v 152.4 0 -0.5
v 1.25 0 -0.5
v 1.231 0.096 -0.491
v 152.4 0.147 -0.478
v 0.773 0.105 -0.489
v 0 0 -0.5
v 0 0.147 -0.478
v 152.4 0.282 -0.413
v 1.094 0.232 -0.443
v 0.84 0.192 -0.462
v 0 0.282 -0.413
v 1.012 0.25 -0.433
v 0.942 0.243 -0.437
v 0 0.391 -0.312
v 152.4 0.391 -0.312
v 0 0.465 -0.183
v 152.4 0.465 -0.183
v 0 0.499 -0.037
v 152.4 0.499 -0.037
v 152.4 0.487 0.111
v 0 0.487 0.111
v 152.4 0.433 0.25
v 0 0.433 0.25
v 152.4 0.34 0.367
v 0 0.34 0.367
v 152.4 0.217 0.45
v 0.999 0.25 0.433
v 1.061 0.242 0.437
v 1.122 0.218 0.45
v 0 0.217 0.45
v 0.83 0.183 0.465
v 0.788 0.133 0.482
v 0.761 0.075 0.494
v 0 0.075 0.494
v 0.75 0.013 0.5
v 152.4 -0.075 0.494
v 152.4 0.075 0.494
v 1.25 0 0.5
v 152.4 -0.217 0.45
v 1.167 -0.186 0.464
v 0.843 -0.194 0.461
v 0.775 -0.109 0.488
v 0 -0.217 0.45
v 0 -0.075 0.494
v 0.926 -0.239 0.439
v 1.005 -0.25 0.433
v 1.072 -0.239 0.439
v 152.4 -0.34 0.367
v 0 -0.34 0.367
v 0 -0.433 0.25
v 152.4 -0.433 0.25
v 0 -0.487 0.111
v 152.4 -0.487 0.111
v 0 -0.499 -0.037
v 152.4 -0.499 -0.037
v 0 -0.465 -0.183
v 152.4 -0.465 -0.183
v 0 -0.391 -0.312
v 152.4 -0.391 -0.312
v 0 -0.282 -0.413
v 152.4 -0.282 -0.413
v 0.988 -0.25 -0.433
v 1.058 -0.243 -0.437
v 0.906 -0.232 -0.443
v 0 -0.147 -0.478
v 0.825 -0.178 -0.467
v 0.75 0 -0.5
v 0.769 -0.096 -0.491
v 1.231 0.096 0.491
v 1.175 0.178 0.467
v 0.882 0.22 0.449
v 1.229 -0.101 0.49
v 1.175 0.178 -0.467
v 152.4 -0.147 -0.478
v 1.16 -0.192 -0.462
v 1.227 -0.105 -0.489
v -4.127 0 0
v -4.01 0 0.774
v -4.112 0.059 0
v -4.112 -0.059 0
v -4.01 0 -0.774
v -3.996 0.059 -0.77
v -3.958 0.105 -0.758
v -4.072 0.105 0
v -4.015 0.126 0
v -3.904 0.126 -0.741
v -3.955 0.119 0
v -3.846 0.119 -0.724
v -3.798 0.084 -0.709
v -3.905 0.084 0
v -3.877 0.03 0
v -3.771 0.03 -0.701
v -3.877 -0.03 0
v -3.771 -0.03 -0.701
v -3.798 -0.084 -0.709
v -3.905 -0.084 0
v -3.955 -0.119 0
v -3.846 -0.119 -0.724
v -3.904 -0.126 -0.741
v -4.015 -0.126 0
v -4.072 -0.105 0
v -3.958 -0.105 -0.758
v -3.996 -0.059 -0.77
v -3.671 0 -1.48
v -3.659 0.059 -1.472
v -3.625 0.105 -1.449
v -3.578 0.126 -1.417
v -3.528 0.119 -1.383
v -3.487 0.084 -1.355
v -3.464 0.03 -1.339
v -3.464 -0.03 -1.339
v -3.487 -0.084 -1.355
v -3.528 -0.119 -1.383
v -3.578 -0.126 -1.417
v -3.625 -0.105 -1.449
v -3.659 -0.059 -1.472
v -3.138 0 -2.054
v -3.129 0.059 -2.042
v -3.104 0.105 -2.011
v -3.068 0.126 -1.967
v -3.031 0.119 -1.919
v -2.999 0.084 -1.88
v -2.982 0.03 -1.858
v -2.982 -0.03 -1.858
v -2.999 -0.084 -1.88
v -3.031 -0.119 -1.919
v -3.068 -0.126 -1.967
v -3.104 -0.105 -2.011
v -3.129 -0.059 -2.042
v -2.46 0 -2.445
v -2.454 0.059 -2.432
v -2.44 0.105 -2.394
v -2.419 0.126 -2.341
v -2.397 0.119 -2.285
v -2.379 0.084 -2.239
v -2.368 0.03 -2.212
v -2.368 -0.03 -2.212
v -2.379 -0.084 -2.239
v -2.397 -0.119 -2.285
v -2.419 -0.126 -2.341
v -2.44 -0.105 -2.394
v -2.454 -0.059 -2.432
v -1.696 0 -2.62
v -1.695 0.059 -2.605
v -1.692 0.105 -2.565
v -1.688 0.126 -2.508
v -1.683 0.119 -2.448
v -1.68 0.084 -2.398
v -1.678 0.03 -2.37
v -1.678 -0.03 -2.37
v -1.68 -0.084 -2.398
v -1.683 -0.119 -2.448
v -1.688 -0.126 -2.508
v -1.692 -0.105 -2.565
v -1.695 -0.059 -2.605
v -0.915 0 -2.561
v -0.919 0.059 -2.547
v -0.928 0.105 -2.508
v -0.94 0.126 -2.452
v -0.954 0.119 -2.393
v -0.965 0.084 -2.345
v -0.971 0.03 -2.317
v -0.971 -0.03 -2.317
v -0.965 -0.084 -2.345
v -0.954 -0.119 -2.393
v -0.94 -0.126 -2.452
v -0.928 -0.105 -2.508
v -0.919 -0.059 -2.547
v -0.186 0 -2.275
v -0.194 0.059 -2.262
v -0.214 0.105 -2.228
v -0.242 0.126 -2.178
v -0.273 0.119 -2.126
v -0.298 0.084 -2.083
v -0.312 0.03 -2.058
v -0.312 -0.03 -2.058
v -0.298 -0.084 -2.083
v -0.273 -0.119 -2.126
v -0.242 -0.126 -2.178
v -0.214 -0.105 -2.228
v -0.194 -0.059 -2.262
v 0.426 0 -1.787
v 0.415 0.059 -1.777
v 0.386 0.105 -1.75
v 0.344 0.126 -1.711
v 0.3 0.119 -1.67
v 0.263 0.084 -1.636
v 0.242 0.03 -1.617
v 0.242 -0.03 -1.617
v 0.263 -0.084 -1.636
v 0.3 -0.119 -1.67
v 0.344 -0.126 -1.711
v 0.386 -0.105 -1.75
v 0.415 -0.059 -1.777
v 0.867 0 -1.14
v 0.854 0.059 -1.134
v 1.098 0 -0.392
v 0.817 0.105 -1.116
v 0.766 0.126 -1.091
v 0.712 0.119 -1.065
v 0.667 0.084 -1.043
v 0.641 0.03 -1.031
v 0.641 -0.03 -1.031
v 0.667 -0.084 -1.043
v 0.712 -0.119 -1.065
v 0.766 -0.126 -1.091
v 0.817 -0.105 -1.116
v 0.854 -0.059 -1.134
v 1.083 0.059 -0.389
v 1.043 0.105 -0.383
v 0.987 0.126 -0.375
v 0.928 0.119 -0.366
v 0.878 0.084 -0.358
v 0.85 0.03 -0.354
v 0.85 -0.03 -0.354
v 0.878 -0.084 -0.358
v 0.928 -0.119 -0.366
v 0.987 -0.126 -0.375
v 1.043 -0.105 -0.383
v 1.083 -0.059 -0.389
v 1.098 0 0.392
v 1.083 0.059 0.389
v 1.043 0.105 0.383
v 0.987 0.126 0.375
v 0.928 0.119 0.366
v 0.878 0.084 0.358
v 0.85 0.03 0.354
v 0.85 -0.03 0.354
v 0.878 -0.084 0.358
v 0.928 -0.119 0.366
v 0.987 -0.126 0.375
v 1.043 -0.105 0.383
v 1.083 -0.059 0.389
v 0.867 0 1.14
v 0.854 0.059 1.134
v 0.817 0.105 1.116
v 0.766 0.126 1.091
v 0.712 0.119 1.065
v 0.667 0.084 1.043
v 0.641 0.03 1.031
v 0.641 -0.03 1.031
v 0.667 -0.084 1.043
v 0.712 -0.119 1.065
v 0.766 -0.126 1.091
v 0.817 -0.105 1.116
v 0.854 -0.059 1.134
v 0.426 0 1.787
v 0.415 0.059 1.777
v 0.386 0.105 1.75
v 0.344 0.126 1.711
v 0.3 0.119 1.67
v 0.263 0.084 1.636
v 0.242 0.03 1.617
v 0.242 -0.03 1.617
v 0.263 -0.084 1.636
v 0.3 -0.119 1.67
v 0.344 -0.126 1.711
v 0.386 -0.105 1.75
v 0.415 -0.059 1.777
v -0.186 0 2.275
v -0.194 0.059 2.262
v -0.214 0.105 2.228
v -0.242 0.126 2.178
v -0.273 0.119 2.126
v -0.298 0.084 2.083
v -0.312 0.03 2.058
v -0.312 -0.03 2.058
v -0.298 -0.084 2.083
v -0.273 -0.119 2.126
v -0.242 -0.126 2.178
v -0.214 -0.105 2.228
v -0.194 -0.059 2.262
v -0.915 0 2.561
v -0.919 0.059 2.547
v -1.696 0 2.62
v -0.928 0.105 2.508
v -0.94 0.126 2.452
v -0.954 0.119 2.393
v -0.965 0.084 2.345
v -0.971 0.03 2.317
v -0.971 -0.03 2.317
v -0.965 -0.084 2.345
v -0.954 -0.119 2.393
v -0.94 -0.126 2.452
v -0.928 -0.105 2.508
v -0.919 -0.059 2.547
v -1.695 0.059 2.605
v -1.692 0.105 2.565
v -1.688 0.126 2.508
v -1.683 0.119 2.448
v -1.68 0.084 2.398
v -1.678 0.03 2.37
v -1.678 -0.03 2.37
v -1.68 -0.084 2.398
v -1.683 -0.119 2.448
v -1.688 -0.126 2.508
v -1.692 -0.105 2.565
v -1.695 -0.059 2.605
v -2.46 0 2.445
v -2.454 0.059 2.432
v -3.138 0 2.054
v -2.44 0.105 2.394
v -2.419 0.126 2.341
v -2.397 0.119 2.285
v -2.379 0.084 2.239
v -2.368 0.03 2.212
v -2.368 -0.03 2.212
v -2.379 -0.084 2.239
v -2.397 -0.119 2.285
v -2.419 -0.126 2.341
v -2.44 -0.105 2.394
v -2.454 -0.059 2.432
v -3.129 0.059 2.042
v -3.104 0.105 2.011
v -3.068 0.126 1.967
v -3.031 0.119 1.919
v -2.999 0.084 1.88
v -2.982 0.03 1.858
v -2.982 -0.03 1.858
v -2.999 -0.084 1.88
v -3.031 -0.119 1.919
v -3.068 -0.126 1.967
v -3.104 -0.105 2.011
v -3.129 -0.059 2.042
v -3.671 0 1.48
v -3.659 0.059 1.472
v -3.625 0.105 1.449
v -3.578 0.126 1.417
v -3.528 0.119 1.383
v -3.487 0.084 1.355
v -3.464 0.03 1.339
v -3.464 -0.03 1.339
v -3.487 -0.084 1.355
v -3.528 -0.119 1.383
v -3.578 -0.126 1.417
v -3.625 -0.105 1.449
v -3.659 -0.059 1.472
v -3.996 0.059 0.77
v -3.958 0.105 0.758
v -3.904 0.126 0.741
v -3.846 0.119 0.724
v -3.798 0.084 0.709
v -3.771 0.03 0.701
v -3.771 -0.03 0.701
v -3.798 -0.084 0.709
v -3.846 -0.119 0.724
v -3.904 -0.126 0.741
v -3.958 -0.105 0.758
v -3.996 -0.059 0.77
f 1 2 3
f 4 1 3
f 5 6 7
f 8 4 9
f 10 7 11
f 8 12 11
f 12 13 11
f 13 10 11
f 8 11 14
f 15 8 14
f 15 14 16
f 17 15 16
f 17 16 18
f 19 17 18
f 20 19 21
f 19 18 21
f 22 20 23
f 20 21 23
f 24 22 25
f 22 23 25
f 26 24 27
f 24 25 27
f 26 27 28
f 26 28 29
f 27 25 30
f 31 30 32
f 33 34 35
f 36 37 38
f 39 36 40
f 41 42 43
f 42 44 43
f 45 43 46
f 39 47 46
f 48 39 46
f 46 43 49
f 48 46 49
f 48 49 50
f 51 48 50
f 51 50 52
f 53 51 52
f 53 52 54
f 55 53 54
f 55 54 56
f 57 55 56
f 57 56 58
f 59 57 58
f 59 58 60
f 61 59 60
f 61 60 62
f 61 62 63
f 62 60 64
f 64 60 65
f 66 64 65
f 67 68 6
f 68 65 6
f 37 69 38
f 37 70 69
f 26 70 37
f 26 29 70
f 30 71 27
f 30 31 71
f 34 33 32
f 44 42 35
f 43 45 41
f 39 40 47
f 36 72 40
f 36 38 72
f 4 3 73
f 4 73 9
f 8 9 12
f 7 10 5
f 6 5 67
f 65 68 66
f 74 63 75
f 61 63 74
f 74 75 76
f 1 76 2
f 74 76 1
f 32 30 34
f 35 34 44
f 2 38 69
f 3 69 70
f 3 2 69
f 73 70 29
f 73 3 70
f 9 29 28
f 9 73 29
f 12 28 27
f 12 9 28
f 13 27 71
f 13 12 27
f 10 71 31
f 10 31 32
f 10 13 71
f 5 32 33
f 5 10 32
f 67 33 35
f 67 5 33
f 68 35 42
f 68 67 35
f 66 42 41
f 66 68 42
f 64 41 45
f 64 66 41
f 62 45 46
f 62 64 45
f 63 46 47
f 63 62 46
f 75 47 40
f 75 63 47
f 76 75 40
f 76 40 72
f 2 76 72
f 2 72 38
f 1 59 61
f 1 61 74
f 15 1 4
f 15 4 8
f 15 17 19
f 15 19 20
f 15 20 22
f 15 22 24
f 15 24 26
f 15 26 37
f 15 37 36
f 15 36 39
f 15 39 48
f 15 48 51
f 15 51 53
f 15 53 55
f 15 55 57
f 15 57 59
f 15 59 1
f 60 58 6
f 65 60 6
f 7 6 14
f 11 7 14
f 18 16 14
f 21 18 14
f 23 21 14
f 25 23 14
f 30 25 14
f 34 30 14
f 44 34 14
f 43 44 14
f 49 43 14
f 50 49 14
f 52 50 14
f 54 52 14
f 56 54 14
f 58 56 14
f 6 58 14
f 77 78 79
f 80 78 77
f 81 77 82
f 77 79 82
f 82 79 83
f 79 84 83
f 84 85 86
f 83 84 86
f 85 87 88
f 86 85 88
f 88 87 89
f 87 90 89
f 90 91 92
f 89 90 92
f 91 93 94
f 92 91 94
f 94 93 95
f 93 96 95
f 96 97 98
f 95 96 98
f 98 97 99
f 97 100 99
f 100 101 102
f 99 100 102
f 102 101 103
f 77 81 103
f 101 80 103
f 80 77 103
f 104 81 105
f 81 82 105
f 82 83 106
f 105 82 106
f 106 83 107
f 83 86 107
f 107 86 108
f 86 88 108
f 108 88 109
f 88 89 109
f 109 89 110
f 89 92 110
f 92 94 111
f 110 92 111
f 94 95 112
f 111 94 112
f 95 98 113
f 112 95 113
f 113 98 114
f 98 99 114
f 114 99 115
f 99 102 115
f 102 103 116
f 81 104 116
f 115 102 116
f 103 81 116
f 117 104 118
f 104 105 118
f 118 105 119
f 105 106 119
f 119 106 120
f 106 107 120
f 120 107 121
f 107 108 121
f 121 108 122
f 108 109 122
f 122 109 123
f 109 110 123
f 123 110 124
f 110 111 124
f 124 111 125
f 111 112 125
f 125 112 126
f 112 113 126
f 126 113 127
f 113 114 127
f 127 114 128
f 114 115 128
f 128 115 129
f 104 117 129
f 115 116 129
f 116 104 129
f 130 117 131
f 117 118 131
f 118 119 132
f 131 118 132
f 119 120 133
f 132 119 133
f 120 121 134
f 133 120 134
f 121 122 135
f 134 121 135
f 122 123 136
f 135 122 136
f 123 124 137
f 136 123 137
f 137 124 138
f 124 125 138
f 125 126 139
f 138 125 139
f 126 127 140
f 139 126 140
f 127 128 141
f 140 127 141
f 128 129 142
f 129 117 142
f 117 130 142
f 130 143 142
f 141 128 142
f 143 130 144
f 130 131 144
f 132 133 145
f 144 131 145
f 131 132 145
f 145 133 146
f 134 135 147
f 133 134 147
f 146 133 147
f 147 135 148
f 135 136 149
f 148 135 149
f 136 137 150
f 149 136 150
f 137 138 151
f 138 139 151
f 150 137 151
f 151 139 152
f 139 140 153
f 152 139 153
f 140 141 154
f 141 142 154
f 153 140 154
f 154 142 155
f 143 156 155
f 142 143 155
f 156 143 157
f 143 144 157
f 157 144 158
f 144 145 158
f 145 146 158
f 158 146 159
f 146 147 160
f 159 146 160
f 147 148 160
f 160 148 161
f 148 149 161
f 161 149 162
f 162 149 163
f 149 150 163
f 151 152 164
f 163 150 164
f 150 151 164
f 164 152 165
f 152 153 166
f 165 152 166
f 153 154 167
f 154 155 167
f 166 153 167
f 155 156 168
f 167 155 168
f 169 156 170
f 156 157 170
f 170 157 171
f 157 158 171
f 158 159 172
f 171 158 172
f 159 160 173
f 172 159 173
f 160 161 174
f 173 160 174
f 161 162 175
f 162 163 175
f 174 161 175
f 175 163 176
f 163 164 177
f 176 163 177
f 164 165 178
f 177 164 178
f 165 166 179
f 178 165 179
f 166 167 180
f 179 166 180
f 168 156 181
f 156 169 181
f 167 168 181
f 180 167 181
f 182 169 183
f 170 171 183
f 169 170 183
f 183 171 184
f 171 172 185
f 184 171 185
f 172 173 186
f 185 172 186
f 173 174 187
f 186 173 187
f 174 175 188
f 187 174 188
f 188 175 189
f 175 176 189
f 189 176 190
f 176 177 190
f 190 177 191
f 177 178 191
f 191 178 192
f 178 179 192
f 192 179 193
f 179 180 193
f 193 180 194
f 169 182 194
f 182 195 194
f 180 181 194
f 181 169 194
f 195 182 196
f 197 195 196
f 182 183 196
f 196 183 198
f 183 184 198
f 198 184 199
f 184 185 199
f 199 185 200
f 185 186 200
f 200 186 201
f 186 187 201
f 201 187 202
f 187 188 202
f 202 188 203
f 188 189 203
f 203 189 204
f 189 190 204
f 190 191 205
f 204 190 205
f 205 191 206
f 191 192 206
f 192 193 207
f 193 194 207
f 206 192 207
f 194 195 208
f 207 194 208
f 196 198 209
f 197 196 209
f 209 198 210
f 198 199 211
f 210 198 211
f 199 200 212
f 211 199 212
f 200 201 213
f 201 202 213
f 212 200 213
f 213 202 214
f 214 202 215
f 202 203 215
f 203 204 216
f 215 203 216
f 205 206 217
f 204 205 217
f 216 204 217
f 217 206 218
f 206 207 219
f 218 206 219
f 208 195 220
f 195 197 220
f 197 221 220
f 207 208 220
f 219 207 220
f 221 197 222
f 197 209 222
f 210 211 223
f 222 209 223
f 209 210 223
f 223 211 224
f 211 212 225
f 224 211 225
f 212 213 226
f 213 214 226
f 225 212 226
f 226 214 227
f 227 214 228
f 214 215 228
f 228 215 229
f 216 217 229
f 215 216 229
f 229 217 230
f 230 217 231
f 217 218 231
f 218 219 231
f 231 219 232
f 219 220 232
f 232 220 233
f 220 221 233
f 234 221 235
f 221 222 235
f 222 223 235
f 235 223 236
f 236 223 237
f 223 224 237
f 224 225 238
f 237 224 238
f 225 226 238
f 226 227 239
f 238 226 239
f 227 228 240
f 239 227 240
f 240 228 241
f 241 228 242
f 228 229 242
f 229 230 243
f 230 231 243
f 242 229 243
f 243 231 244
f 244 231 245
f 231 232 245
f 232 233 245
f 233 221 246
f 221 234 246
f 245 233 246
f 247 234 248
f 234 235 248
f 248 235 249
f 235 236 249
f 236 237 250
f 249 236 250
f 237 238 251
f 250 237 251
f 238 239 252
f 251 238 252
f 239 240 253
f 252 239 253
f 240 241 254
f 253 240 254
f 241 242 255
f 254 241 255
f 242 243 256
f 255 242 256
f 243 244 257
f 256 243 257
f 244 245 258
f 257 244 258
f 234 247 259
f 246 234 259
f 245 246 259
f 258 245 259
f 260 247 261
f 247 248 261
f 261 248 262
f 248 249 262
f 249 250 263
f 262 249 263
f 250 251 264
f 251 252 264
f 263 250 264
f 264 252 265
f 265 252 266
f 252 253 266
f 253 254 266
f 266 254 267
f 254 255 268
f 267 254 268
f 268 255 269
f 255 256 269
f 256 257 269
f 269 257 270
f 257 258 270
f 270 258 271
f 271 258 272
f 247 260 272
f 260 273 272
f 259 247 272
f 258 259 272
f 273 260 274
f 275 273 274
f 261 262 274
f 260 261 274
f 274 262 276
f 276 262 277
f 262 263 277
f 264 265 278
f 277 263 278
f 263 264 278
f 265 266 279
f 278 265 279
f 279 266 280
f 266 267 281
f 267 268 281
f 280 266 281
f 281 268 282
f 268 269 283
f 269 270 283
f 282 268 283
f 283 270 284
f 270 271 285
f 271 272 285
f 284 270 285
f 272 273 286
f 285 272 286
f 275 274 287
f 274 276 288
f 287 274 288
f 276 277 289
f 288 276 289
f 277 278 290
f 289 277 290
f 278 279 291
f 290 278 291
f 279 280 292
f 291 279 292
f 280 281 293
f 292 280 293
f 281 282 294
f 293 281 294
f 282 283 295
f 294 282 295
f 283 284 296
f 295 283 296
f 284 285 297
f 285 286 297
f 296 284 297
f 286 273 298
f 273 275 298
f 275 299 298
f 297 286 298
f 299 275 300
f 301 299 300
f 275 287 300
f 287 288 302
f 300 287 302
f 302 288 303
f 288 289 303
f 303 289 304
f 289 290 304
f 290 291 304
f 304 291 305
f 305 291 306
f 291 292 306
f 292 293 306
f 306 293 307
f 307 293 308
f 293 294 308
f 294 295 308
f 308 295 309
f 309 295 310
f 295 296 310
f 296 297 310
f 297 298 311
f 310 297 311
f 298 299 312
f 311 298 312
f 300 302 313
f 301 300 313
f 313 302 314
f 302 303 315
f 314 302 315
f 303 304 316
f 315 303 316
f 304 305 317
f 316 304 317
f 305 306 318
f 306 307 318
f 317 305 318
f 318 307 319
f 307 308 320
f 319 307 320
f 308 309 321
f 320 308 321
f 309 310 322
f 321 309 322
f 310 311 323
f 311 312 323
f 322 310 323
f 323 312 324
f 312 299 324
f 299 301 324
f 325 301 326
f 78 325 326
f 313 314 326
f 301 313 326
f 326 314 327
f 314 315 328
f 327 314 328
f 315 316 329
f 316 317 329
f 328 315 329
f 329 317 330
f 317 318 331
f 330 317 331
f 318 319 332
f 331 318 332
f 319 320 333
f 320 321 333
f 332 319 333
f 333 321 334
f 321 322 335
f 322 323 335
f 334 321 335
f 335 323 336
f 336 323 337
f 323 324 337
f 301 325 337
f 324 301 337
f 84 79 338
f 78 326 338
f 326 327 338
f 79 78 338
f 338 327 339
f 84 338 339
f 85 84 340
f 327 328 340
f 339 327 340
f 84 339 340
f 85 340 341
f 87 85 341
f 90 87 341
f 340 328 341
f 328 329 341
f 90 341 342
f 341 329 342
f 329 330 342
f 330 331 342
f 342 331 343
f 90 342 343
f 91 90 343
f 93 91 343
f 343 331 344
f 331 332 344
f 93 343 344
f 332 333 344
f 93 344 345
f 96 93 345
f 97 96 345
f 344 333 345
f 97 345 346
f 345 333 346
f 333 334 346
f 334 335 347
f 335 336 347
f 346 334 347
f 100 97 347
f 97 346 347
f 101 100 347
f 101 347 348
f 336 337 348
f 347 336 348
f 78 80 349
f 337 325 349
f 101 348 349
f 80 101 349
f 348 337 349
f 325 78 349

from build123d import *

# Parameters (mm, degrees)
SKETCH1_R               = 0.5
BOSS_EXTRUDE1_DEPTH     = 152.4
CUT_EXTRUDE1_DEPTH      = 153.401640411
CUT_EXTRUDE1_DEPTH_BACK = 153.401640411
SKETCH2_R               = 0.25
SKETCH7_R               = 0.127


with BuildPart() as part:
    # Sketch1 → Boss-Extrude1 (new body)
    with BuildSketch(Plane(origin=(0, 0, 0), x_dir=(0, 0, -1), z_dir=(1, 0, 0))):
        Circle(SKETCH1_R)
    extrude(amount=BOSS_EXTRUDE1_DEPTH)

    # Sketch2 → Cut-Extrude1 (cut, two sides: drawn at the far end of the back side and taken through both)
    with BuildSketch(Plane.XY.offset(-CUT_EXTRUDE1_DEPTH_BACK)):
        with Locations((1, 0)):
            Circle(SKETCH2_R)
    extrude(amount=CUT_EXTRUDE1_DEPTH + CUT_EXTRUDE1_DEPTH_BACK, mode=Mode.SUBTRACT)


with BuildPart() as body_2:
    # Sketch7 → Revolve7 (revolve)
    with BuildSketch(Plane.XY, mode=Mode.PRIVATE) as revolve7_sk:
        with Locations((1, 0)):
            Circle(SKETCH7_R)
    revolve(revolve7_sk.sketch.rotate(Axis((-1.5, 0.693957826, 0), (0, -1, 0)), 180), axis=Axis((-1.5, 0.693957826, 0), (0, -1, 0)))


solid = Compound([part.part, body_2.part])
